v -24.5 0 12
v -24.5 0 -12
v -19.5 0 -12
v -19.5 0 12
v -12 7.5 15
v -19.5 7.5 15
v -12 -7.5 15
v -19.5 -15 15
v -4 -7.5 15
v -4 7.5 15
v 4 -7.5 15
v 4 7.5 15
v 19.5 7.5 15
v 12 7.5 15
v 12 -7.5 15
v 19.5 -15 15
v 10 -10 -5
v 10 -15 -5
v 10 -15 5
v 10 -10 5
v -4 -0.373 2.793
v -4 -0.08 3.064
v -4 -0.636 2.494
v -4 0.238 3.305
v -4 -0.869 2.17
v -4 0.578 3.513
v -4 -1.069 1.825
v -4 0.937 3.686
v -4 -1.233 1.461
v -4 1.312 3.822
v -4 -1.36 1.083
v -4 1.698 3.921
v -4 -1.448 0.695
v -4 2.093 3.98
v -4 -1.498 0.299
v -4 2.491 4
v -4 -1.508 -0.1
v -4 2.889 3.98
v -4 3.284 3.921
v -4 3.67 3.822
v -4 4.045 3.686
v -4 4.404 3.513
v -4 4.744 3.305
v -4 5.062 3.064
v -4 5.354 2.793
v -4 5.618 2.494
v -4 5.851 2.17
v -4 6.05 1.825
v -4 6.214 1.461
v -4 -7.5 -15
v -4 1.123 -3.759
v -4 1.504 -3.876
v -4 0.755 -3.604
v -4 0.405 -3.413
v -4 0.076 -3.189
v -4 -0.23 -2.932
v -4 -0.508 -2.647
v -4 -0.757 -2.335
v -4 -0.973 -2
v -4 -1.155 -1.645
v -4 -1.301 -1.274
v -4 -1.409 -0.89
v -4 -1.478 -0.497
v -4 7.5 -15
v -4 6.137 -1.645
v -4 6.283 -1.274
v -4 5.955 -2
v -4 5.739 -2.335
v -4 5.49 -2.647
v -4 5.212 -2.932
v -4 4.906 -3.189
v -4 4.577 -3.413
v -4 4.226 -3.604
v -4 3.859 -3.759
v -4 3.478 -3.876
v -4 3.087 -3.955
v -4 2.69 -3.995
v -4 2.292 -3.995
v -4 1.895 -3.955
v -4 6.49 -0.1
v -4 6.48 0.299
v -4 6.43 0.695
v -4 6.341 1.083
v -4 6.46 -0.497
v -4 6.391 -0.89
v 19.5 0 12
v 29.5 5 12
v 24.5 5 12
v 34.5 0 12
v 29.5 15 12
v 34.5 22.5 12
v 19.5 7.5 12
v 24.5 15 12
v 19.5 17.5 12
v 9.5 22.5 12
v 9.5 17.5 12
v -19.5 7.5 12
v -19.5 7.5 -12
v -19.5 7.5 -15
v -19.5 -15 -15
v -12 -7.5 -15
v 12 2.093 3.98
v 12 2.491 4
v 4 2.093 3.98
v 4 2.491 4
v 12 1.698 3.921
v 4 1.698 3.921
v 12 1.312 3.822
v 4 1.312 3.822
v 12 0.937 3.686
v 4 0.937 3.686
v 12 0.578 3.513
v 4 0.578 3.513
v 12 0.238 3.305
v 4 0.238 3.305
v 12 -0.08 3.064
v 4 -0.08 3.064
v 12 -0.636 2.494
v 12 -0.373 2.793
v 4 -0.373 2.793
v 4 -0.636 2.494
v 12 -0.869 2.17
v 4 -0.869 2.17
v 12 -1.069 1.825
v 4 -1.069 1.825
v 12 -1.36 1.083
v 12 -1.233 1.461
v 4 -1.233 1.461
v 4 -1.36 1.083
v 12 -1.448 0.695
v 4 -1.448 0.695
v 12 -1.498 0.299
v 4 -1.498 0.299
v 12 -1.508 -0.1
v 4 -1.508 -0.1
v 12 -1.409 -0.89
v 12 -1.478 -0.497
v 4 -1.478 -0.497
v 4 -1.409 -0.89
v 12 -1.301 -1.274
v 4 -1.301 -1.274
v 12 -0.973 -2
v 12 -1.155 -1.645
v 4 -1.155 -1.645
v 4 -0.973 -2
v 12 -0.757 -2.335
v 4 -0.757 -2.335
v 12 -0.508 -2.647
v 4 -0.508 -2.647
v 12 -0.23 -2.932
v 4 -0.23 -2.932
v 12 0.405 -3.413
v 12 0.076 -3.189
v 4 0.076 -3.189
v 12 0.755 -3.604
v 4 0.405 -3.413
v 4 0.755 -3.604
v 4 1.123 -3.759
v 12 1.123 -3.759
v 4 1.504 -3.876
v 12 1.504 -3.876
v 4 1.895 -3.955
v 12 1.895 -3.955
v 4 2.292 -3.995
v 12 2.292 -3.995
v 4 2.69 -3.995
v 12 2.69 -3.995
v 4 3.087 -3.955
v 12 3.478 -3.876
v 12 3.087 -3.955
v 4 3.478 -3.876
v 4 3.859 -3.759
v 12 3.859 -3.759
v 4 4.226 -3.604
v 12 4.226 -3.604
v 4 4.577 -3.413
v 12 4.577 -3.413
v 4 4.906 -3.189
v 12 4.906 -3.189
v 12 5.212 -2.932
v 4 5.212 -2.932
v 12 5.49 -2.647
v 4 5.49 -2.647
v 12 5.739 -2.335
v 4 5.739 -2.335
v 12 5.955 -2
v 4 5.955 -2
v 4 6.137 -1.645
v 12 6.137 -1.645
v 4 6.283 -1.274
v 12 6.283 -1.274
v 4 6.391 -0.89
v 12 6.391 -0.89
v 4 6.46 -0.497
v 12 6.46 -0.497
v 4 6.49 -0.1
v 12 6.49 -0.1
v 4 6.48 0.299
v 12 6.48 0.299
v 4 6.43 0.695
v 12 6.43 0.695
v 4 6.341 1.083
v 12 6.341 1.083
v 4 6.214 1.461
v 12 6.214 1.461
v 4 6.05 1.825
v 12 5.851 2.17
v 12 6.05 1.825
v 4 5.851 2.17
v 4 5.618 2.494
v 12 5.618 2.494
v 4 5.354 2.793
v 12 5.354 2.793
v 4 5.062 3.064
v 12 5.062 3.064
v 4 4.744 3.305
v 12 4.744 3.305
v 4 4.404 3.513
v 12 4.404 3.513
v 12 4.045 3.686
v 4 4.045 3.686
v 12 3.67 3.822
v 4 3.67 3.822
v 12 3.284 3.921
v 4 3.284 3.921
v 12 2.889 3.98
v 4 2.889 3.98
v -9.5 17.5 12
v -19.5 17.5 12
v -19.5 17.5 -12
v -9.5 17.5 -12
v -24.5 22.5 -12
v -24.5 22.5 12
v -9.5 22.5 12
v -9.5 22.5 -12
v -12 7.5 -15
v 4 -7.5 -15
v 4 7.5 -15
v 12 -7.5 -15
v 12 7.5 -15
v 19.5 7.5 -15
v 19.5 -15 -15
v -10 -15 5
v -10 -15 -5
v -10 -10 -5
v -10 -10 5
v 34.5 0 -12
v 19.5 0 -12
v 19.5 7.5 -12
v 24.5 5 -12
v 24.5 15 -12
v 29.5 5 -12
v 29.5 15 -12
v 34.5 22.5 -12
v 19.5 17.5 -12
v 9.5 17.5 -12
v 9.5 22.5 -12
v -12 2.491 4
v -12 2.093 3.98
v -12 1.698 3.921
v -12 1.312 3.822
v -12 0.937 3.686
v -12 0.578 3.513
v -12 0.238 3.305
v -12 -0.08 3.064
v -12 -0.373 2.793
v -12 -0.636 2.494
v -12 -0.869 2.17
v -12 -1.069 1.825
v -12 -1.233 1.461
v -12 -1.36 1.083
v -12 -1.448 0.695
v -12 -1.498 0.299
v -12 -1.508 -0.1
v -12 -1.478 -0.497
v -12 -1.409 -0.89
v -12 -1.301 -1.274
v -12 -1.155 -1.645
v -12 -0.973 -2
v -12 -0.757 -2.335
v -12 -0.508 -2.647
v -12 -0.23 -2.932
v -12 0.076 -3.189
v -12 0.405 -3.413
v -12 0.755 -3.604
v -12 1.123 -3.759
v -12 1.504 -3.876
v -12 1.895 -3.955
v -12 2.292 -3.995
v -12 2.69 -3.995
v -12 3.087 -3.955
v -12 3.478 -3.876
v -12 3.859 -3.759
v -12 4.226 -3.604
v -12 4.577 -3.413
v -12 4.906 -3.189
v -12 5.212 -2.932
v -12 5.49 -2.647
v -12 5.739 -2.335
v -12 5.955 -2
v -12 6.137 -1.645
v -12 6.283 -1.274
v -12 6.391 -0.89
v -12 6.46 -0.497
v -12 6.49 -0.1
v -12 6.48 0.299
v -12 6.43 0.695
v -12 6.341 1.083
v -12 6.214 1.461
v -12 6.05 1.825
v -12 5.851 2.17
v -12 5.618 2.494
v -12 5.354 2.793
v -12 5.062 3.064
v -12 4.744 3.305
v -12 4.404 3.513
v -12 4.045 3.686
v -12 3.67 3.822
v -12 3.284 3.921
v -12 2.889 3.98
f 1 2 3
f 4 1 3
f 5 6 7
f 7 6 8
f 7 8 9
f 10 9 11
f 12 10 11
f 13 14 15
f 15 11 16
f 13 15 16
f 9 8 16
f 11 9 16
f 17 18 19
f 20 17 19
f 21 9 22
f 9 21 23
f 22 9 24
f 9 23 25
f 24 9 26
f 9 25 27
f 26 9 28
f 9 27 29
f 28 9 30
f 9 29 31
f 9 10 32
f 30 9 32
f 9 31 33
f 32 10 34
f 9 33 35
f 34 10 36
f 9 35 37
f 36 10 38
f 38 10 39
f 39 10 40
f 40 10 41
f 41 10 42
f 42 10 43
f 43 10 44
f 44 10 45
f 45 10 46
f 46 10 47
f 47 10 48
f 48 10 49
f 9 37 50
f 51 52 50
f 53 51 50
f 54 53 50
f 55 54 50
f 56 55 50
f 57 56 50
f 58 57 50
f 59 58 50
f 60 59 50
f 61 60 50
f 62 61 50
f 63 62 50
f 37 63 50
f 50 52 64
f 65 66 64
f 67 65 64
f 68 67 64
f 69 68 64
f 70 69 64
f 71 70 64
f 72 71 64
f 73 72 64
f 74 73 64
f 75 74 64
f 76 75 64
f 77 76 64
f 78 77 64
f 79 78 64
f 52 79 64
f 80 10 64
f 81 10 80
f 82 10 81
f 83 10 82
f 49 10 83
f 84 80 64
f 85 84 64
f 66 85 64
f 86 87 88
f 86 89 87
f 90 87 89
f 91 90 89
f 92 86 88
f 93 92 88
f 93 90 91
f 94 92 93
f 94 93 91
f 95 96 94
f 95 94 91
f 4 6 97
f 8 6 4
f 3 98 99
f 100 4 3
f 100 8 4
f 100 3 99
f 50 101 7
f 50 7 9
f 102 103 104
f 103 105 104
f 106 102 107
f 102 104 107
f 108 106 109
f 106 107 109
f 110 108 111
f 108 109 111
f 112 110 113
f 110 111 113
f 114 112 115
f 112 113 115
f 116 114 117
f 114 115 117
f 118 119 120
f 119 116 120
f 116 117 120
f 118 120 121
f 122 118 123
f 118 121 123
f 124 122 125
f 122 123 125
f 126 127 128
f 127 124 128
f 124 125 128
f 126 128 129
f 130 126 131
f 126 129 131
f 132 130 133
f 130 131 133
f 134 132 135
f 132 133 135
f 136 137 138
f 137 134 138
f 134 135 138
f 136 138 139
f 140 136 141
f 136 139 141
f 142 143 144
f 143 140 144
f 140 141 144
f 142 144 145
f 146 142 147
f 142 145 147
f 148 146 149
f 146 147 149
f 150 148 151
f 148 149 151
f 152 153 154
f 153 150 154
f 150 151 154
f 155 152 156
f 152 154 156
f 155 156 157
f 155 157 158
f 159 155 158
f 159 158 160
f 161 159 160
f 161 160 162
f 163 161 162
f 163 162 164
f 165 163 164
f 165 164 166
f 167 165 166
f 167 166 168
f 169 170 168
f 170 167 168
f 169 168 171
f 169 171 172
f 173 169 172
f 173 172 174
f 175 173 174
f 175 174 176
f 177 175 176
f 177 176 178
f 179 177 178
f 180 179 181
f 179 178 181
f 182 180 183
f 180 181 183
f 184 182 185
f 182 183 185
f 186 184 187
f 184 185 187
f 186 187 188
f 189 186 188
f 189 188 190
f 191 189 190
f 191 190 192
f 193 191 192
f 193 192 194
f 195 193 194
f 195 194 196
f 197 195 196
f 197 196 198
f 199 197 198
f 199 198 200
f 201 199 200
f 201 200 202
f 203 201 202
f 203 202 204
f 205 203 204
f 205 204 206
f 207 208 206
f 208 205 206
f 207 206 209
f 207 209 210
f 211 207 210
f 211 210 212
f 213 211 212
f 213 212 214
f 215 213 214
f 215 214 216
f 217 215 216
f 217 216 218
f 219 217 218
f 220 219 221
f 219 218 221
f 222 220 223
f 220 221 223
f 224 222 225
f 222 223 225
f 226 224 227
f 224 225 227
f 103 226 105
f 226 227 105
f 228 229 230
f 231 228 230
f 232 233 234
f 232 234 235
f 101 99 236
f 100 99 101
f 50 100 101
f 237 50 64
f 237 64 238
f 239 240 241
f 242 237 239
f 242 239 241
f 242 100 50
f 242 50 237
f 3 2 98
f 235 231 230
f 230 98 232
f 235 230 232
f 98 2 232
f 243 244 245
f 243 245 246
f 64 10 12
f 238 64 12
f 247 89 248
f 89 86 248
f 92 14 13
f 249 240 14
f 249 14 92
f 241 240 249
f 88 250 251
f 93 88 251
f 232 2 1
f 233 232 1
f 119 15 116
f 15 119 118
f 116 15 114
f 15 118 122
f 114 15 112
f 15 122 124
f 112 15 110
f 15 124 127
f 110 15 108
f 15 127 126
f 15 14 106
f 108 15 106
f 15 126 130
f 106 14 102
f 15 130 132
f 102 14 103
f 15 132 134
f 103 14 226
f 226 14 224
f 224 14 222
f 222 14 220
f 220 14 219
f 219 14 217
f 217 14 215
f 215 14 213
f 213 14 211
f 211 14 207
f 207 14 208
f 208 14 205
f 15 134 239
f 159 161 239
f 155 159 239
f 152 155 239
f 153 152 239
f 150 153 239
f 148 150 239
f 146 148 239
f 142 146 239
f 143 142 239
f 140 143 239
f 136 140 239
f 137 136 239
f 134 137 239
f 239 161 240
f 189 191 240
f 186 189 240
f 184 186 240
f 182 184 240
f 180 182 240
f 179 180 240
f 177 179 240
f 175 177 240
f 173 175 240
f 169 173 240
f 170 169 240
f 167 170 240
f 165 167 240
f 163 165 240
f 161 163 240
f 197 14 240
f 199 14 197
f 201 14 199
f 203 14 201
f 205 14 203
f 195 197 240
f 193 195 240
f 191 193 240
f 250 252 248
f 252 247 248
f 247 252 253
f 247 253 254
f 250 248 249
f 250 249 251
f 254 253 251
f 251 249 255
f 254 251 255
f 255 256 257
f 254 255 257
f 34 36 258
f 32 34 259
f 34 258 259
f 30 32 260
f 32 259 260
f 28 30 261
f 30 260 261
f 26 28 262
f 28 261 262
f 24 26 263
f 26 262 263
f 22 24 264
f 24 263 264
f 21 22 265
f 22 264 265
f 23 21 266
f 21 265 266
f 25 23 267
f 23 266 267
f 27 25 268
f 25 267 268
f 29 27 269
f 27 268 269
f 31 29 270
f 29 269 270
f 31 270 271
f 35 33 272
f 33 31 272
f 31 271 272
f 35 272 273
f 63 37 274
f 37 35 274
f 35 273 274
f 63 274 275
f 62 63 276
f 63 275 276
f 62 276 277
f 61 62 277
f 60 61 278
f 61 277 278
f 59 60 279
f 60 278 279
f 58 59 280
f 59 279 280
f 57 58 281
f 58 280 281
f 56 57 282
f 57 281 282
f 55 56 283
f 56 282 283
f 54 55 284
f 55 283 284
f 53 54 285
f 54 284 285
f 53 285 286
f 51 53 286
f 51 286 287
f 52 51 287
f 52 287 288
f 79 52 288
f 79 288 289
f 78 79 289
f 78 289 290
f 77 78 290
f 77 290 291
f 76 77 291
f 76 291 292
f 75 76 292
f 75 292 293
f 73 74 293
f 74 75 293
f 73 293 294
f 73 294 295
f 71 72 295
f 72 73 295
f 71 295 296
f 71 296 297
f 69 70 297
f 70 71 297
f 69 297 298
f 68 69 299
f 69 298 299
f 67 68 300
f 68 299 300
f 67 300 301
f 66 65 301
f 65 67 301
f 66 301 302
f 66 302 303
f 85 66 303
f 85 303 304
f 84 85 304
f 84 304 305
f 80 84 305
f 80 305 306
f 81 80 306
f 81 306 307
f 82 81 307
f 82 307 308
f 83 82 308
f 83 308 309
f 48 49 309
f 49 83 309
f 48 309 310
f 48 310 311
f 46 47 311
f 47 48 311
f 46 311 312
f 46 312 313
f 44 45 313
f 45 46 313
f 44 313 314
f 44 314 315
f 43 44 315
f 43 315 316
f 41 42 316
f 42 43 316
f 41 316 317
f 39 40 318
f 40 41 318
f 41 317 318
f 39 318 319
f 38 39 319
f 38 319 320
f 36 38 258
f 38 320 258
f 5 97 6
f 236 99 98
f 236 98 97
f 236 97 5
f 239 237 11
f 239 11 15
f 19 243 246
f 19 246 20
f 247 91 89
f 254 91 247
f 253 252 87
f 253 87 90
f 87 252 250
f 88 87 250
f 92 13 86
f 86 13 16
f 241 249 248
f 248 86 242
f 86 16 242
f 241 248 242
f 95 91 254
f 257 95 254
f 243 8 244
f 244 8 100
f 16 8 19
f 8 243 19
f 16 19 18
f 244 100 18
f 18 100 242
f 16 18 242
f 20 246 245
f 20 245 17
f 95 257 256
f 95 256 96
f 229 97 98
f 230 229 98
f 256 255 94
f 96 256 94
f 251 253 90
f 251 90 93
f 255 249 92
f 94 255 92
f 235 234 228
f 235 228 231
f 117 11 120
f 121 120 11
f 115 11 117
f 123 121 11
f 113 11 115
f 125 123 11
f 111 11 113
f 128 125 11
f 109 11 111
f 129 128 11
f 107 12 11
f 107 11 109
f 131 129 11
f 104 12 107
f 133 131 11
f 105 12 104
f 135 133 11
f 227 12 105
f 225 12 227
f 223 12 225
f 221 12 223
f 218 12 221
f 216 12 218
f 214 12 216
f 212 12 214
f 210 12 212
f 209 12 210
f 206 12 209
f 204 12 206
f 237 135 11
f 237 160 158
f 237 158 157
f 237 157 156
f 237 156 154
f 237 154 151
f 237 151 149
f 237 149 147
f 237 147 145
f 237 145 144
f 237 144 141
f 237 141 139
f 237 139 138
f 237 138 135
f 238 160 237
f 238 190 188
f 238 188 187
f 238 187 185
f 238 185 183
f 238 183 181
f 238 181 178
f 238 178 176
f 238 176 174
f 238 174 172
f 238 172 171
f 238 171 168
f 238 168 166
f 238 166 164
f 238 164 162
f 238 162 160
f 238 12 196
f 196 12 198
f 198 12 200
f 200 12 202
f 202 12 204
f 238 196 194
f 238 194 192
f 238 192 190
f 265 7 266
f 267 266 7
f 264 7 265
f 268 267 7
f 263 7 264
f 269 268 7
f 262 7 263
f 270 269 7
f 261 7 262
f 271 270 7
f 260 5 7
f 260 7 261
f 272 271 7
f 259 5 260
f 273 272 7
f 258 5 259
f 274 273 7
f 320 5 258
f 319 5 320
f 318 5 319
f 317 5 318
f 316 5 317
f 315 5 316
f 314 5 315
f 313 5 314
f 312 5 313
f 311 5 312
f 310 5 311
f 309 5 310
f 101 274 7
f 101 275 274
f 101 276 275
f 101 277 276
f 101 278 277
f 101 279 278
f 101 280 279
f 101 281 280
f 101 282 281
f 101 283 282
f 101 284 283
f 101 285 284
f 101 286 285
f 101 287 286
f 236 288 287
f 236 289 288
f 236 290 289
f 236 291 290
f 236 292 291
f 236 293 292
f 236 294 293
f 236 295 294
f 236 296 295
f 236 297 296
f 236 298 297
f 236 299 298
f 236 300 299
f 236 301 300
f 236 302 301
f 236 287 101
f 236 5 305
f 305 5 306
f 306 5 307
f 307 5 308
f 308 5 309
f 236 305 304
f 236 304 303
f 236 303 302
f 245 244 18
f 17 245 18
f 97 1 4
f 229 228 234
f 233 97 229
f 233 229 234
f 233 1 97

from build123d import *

# Parameters (mm, degrees)
BOSS_EXTRU_1_DEPTH      = 7.5
BOSS_EXTRU_1_DEPTH_BACK = 15
ESQUISSE1_W             = 39
ESQUISSE1_H             = 30
BOSS_EXTRU_2_DEPTH      = 22.5
ESQUISSE3_W             = 24
ESQUISSE3_H             = 5
BOSS_EXTRU_3_DEPTH      = 10
ESQUISSE4_W             = 24
ESQUISSE4_H             = 5
BOSS_EXTRU_4_DEPTH      = 10
ESQUISSE5_W             = 24
ESQUISSE5_H             = 22.5
BOSS_EXTRU_5_DEPTH      = 10
ESQUISSE6_W             = 5
ESQUISSE6_H             = 10
ENL_V_MAT_EXTRU_1_DEPTH = 50.249365478
ESQUISSE7_W             = 8
ESQUISSE7_H             = 30
ENL_V_MAT_EXTRU_2_DEPTH = 15
ESQUISSE8_R             = 4
BOSS_EXTRU_6_DEPTH      = 25
ESQUISSE9_W             = 20
ESQUISSE9_H             = 10
ENL_V_MAT_EXTRU_3_DEPTH = 5


with BuildPart() as part:
    # Esquisse1 → Boss.-Extru.1 (new, two sides: drawn at the far end of the back side and taken through both)
    with BuildSketch(Plane(origin=(0, 0, 0), x_dir=(1, 0, 0), z_dir=(0, 1, 0)).offset(-BOSS_EXTRU_1_DEPTH_BACK)):
        Rectangle(ESQUISSE1_W, ESQUISSE1_H)
    extrude(amount=BOSS_EXTRU_1_DEPTH + BOSS_EXTRU_1_DEPTH_BACK)

    # Esquisse2 → Boss.-Extru.2 (add)
    with BuildSketch(Plane(origin=(0, 0, 0), x_dir=(1, 0, 0), z_dir=(0, 1, 0))):
        Polygon((-19.5, 0), (-19.5, 12), (-24.5, 12), (-24.5, -12), (-19.5, -12), align=None)
        Polygon((19.5, 0), (19.5, 12), (24.5, 12), (24.5, -12), (19.5, -12), align=None)
    extrude(amount=BOSS_EXTRU_2_DEPTH)

    # Esquisse3 → Boss.-Extru.3 (add)
    with BuildSketch(Plane(origin=(-19.5, 0, 0), x_dir=(0, 0, -1), z_dir=(1, 0, 0))):
        with Locations((0, 20)):
            Rectangle(ESQUISSE3_W, ESQUISSE3_H)
    extrude(amount=BOSS_EXTRU_3_DEPTH)

    # Esquisse4 → Boss.-Extru.4 (add)
    with BuildSketch(Plane.ZY.offset(-19.5)):
        with Locations((0, 20)):
            Rectangle(ESQUISSE4_W, ESQUISSE4_H)
    extrude(amount=BOSS_EXTRU_4_DEPTH)

    # Esquisse5 → Boss.-Extru.5 (add)
    with BuildSketch(Plane(origin=(24.5, 0, 0), x_dir=(0, 0, -1), z_dir=(1, 0, 0))):
        with Locations((0, 11.25)):
            Rectangle(ESQUISSE5_W, ESQUISSE5_H)
    extrude(amount=BOSS_EXTRU_5_DEPTH)

    # Esquisse6 → Enlèv. mat.-Extru.1 (cut, through all)
    with BuildSketch(Plane(origin=(0, 0, -12), x_dir=(-1, 0, 0), z_dir=(0, 0, -1))):
        with Locations((-27, 10)):
            Rectangle(ESQUISSE6_W, ESQUISSE6_H)
    extrude(amount=-ENL_V_MAT_EXTRU_1_DEPTH, mode=Mode.SUBTRACT)

    # Esquisse7 → Enlèv. mat.-Extru.2 (cut)
    with BuildSketch(Plane(origin=(0, 7.5, 0), x_dir=(1, 0, 0), z_dir=(0, 1, 0))):
        with Locations((-8, 0)):
            Rectangle(ESQUISSE7_W, ESQUISSE7_H)
        with Locations((8, 0)):
            Rectangle(ESQUISSE7_W, ESQUISSE7_H)
    extrude(amount=-ENL_V_MAT_EXTRU_2_DEPTH, mode=Mode.SUBTRACT)

    # Esquisse8 → Boss.-Extru.6 (add)
    with BuildSketch(Plane(origin=(-12, 0, 0), x_dir=(0, 0, -1), z_dir=(1, 0, 0))):
        with Locations(Location((0, 2.490962546, 0), (0, 0, 180))):
            Circle(ESQUISSE8_R)
    extrude(amount=BOSS_EXTRU_6_DEPTH)

    # Esquisse9 → Enlèv. mat.-Extru.3 (cut)
    with BuildSketch(Plane.XZ.offset(15)):
        Rectangle(ESQUISSE9_W, ESQUISSE9_H)
    extrude(amount=-ENL_V_MAT_EXTRU_3_DEPTH, mode=Mode.SUBTRACT)


solid = part.part
